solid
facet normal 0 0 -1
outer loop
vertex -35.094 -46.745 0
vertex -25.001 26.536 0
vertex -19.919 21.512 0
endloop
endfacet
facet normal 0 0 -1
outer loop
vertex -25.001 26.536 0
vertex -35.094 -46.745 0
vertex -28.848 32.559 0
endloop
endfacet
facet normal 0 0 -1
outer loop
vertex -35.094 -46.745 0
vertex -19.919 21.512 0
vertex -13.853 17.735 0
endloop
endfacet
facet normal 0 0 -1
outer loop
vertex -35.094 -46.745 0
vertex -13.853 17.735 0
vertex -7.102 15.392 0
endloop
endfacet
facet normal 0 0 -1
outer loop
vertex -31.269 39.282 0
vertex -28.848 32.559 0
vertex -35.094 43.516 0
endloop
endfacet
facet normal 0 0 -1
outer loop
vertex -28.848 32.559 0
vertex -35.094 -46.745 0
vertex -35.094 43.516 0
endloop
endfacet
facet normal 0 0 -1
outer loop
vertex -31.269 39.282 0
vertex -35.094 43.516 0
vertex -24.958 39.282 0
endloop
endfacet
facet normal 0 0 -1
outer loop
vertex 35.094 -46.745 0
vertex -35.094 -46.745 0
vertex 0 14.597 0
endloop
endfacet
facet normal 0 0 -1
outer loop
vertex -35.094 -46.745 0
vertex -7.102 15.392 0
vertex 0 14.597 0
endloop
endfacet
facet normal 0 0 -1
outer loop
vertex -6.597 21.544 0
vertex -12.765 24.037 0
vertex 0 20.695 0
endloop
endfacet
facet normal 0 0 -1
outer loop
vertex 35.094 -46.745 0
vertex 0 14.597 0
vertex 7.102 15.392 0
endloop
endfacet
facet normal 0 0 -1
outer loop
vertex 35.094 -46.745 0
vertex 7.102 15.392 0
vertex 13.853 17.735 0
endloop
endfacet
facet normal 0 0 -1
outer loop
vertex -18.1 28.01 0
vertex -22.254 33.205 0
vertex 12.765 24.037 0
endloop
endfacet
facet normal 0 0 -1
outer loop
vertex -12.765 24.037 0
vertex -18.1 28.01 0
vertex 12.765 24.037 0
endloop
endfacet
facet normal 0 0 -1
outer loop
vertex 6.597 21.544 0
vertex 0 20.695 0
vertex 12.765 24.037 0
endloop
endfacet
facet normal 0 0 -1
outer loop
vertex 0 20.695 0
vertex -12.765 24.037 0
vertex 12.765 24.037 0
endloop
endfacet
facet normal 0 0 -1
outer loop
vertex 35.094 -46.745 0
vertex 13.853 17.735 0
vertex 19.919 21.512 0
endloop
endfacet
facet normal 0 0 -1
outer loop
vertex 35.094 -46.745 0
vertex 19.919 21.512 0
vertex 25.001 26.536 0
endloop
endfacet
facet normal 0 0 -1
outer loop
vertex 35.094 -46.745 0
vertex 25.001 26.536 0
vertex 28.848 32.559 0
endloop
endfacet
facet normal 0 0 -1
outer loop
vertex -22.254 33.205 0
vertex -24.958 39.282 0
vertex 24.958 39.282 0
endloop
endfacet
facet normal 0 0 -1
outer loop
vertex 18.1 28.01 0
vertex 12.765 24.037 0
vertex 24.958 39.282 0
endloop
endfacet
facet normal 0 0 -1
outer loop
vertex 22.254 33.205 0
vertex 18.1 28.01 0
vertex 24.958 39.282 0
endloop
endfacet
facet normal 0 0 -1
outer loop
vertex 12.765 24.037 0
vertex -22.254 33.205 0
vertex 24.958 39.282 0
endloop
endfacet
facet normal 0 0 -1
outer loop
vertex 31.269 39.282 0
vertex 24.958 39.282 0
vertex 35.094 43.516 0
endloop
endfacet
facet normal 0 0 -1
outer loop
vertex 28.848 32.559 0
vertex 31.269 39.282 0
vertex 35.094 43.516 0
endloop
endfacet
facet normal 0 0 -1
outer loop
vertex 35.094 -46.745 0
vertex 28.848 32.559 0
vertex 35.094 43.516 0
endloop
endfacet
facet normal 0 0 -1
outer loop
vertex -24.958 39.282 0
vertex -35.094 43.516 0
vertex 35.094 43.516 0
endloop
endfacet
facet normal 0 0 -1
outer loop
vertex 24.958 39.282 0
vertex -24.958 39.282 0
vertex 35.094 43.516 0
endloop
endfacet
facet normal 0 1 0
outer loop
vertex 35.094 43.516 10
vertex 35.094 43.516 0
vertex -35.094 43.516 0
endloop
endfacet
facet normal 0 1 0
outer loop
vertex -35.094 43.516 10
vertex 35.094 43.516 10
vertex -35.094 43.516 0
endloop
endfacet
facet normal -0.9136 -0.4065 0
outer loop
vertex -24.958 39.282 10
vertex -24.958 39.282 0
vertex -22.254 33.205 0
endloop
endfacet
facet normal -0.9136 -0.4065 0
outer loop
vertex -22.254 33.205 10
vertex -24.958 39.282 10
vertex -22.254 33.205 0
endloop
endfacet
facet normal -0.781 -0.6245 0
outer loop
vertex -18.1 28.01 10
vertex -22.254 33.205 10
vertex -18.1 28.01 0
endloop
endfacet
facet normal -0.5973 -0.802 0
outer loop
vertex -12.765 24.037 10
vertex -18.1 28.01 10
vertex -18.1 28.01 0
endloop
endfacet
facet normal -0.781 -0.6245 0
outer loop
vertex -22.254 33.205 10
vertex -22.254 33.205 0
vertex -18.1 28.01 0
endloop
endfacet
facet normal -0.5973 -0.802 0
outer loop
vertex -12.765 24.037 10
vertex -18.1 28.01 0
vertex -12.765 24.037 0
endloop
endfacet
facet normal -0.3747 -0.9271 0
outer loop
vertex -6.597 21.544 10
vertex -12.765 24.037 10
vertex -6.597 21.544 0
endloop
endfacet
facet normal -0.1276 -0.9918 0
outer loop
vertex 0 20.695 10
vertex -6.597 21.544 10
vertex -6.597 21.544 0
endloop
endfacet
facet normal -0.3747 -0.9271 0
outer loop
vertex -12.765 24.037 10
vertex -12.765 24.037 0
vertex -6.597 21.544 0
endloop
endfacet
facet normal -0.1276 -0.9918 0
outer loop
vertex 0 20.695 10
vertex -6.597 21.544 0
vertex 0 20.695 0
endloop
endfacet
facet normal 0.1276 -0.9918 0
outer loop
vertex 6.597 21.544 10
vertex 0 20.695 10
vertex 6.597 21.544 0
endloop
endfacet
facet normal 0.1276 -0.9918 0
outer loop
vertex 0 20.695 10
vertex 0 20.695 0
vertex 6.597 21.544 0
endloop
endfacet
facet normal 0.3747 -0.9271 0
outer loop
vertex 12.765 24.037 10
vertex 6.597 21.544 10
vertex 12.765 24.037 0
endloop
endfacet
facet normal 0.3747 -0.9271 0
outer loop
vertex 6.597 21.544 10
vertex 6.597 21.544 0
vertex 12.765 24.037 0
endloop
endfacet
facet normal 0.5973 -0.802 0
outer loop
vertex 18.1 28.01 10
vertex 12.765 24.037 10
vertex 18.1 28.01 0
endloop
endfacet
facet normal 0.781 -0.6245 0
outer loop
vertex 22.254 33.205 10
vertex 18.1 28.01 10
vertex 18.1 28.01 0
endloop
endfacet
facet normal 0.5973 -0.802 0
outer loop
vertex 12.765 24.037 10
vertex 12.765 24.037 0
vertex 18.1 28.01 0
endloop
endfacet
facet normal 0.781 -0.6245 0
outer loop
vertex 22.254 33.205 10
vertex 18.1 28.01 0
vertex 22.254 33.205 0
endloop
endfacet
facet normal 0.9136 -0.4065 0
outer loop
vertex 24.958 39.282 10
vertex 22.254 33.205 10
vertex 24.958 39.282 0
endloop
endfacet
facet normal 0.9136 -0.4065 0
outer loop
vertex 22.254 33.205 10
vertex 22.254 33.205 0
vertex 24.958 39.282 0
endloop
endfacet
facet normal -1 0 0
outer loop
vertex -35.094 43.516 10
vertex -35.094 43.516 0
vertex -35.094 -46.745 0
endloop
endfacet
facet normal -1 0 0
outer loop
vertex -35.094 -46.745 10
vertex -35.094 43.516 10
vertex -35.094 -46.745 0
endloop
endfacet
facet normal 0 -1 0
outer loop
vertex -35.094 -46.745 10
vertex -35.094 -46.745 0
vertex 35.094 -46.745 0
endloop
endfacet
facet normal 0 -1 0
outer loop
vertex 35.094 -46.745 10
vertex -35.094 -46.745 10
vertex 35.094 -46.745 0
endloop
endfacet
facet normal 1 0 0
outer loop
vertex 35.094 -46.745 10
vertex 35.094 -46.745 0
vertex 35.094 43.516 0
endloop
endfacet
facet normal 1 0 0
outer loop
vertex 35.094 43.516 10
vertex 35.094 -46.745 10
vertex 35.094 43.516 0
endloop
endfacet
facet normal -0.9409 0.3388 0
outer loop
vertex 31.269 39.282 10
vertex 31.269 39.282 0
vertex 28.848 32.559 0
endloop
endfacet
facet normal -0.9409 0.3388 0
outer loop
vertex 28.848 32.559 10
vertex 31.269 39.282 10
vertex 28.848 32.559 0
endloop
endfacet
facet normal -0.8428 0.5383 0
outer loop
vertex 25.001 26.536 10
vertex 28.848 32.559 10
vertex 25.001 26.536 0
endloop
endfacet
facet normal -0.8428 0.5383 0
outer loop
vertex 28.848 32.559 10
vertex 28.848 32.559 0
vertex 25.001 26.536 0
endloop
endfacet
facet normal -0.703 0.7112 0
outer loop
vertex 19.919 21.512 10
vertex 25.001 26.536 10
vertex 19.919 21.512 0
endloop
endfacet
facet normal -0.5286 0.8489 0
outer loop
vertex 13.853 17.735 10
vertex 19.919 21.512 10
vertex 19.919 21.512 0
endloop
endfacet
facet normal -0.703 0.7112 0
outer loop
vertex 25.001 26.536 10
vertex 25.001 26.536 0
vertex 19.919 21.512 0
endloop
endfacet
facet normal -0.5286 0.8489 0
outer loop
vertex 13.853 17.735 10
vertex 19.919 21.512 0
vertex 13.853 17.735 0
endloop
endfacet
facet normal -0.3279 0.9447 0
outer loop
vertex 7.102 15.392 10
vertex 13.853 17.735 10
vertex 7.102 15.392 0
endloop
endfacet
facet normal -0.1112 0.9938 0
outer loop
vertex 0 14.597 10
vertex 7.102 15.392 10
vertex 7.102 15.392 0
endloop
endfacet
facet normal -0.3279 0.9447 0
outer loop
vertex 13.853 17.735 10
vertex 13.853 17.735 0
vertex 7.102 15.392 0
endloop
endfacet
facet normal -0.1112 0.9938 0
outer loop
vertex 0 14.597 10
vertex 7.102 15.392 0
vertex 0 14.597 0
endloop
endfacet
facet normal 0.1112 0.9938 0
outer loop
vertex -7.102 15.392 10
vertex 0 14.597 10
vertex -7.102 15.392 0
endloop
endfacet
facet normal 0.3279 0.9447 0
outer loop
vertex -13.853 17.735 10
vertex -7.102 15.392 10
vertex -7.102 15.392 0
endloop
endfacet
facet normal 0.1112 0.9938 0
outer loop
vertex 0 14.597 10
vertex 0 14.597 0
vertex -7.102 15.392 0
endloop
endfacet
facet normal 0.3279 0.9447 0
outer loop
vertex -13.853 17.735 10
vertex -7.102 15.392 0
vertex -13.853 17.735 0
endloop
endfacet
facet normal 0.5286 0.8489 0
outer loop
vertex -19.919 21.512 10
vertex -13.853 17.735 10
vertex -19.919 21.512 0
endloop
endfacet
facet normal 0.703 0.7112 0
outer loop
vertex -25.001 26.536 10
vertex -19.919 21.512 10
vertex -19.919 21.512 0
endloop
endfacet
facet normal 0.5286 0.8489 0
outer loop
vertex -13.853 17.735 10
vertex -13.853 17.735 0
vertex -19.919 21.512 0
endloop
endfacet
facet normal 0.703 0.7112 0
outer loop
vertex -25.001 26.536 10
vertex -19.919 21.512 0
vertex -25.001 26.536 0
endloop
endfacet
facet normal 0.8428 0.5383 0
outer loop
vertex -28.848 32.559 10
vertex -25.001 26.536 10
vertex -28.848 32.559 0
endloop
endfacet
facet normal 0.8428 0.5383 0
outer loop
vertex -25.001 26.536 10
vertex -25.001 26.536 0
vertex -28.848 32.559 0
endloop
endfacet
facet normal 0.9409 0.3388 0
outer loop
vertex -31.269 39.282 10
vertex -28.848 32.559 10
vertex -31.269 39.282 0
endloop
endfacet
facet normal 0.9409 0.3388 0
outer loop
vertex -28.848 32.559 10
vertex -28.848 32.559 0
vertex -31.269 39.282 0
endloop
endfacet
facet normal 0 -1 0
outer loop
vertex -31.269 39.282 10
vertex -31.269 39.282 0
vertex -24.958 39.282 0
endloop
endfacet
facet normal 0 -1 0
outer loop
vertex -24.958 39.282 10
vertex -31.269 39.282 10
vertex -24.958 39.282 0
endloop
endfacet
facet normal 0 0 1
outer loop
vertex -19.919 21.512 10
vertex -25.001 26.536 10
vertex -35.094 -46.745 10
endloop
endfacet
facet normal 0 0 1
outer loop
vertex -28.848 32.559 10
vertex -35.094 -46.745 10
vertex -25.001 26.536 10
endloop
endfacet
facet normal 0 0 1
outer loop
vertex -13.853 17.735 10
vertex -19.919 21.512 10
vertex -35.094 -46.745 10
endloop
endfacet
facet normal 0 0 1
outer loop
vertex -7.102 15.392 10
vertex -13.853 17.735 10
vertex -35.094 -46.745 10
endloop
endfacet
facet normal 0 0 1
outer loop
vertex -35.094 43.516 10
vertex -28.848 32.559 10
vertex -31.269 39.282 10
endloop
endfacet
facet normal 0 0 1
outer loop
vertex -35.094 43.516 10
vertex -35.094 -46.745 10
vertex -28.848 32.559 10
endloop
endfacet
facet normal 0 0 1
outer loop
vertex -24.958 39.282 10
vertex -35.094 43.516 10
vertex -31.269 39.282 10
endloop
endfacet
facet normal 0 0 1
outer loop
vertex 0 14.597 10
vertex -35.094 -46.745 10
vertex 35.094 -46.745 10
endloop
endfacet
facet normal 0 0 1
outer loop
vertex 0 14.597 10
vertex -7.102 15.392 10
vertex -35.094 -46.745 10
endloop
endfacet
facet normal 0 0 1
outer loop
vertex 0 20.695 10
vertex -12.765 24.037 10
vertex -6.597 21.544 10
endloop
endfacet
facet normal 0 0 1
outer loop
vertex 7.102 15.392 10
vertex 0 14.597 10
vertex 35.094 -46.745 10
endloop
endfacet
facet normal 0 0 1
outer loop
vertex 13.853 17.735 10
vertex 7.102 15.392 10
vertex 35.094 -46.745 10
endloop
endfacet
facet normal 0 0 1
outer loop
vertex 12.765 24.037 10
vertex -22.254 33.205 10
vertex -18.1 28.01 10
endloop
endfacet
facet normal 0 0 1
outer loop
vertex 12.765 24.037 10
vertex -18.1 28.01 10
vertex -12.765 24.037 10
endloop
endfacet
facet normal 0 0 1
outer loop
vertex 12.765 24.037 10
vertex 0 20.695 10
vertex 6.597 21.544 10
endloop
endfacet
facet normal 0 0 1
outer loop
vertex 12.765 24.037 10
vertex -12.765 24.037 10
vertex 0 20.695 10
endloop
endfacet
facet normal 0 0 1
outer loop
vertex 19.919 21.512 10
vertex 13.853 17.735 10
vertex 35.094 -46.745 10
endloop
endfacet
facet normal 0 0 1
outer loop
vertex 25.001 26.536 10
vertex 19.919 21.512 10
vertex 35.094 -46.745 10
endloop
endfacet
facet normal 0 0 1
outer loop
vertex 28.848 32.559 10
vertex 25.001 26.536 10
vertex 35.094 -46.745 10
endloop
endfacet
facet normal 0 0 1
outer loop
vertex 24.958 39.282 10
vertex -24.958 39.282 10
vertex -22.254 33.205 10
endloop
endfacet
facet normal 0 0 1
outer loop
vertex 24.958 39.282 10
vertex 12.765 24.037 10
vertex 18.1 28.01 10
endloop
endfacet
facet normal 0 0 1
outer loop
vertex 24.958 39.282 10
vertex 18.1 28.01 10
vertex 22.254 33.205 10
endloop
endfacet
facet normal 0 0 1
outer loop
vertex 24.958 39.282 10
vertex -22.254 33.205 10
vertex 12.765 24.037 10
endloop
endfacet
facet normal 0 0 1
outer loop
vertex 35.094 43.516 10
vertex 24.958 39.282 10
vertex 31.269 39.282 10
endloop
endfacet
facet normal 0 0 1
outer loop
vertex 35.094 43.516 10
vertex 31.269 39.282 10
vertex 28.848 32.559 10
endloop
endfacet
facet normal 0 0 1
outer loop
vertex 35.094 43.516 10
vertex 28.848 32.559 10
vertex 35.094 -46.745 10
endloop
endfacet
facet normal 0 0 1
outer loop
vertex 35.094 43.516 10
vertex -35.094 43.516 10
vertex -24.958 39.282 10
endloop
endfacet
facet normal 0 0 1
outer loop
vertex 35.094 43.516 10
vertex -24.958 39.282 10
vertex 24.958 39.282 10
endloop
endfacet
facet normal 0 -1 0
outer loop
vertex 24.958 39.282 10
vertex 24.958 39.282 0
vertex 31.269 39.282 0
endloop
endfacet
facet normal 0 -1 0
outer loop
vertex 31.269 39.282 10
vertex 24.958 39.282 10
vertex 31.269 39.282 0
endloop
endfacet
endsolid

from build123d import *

# Parameters (mm, degrees)
F1_DEPTH = 10


with BuildPart() as f1:
    # F0 (on Top) → F1 (new body)
    with BuildSketch(Plane.XY):
        with BuildLine():
            ThreePointArc((-24.958041373, 39.2821468413), (-25.4915434809, 41.3805095925), (-25.8489488203, 43.5159280896))
            Line((-25.8489488203, 43.5159280896), (-31.9847488633, 43.5159280896))
            ThreePointArc((-31.9847488633, 43.5159280896), (-31.6977160516, 41.3870765544), (-31.2691514741, 39.2821468413))
            Line((-31.2691514741, 39.2821468413), (-24.958041373, 39.2821468413))
        make_face()
        with BuildLine():
            Line((35.0935831666, 39.2821468413), (31.2691514741, 39.2821468413))
            ThreePointArc((31.2691514741, 39.2821468413), (0, 14.5973533174), (-31.2691514741, 39.2821468413))
            Line((-31.2691514741, 39.2821468413), (-35.0935831666, 39.2821468413))
            Line((-35.0935831666, 39.2821468413), (-35.0935831666, -46.7446520925))
            Line((-35.0935831666, -46.7446520925), (35.0935831666, -46.7446520925))
            Line((35.0935831666, -46.7446520925), (35.0935831666, 39.2821468413))
        make_face()
        with BuildLine():
            ThreePointArc((-31.2691514741, 39.2821468413), (-31.6977160516, 41.3870765544), (-31.9847488633, 43.5159280896))
            Line((-31.9847488633, 43.5159280896), (-35.0935831666, 43.5159280896))
            Line((-35.0935831666, 43.5159280896), (-35.0935831666, 39.2821468413))
            Line((-35.0935831666, 39.2821468413), (-31.2691514741, 39.2821468413))
        make_face()
        with BuildLine():
            ThreePointArc((24.958041373, 39.2821468413), (25.4915434809, 41.3805095925), (25.8489488203, 43.5159280896))
            Line((25.8489488203, 43.5159280896), (-25.8489488203, 43.5159280896))
            ThreePointArc((-25.8489488203, 43.5159280896), (-25.4915434809, 41.3805095925), (-24.958041373, 39.2821468413))
            Line((-24.958041373, 39.2821468413), (24.958041373, 39.2821468413))
        make_face()
        with BuildLine():
            Line((31.9847488633, 43.5159280896), (25.8489488203, 43.5159280896))
            ThreePointArc((25.8489488203, 43.5159280896), (25.4915434809, 41.3805095925), (24.958041373, 39.2821468413))
            Line((24.958041373, 39.2821468413), (31.2691514741, 39.2821468413))
            ThreePointArc((31.2691514741, 39.2821468413), (31.6977160516, 41.3870765544), (31.9847488633, 43.5159280896))
        make_face()
        with BuildLine():
            Line((35.0935831666, 43.5159280896), (31.9847488633, 43.5159280896))
            ThreePointArc((31.9847488633, 43.5159280896), (31.6977160516, 41.3870765544), (31.2691514741, 39.2821468413))
            Line((31.2691514741, 39.2821468413), (35.0935831666, 39.2821468413))
            Line((35.0935831666, 39.2821468413), (35.0935831666, 43.5159280896))
        make_face()
        with BuildLine():
            ThreePointArc((-24.958041373, 39.2821468413), (0, 20.6948380086), (24.958041373, 39.2821468413))
            Line((24.958041373, 39.2821468413), (-24.958041373, 39.2821468413))
        make_face()
    extrude(amount=F1_DEPTH)


solid = f1.part
